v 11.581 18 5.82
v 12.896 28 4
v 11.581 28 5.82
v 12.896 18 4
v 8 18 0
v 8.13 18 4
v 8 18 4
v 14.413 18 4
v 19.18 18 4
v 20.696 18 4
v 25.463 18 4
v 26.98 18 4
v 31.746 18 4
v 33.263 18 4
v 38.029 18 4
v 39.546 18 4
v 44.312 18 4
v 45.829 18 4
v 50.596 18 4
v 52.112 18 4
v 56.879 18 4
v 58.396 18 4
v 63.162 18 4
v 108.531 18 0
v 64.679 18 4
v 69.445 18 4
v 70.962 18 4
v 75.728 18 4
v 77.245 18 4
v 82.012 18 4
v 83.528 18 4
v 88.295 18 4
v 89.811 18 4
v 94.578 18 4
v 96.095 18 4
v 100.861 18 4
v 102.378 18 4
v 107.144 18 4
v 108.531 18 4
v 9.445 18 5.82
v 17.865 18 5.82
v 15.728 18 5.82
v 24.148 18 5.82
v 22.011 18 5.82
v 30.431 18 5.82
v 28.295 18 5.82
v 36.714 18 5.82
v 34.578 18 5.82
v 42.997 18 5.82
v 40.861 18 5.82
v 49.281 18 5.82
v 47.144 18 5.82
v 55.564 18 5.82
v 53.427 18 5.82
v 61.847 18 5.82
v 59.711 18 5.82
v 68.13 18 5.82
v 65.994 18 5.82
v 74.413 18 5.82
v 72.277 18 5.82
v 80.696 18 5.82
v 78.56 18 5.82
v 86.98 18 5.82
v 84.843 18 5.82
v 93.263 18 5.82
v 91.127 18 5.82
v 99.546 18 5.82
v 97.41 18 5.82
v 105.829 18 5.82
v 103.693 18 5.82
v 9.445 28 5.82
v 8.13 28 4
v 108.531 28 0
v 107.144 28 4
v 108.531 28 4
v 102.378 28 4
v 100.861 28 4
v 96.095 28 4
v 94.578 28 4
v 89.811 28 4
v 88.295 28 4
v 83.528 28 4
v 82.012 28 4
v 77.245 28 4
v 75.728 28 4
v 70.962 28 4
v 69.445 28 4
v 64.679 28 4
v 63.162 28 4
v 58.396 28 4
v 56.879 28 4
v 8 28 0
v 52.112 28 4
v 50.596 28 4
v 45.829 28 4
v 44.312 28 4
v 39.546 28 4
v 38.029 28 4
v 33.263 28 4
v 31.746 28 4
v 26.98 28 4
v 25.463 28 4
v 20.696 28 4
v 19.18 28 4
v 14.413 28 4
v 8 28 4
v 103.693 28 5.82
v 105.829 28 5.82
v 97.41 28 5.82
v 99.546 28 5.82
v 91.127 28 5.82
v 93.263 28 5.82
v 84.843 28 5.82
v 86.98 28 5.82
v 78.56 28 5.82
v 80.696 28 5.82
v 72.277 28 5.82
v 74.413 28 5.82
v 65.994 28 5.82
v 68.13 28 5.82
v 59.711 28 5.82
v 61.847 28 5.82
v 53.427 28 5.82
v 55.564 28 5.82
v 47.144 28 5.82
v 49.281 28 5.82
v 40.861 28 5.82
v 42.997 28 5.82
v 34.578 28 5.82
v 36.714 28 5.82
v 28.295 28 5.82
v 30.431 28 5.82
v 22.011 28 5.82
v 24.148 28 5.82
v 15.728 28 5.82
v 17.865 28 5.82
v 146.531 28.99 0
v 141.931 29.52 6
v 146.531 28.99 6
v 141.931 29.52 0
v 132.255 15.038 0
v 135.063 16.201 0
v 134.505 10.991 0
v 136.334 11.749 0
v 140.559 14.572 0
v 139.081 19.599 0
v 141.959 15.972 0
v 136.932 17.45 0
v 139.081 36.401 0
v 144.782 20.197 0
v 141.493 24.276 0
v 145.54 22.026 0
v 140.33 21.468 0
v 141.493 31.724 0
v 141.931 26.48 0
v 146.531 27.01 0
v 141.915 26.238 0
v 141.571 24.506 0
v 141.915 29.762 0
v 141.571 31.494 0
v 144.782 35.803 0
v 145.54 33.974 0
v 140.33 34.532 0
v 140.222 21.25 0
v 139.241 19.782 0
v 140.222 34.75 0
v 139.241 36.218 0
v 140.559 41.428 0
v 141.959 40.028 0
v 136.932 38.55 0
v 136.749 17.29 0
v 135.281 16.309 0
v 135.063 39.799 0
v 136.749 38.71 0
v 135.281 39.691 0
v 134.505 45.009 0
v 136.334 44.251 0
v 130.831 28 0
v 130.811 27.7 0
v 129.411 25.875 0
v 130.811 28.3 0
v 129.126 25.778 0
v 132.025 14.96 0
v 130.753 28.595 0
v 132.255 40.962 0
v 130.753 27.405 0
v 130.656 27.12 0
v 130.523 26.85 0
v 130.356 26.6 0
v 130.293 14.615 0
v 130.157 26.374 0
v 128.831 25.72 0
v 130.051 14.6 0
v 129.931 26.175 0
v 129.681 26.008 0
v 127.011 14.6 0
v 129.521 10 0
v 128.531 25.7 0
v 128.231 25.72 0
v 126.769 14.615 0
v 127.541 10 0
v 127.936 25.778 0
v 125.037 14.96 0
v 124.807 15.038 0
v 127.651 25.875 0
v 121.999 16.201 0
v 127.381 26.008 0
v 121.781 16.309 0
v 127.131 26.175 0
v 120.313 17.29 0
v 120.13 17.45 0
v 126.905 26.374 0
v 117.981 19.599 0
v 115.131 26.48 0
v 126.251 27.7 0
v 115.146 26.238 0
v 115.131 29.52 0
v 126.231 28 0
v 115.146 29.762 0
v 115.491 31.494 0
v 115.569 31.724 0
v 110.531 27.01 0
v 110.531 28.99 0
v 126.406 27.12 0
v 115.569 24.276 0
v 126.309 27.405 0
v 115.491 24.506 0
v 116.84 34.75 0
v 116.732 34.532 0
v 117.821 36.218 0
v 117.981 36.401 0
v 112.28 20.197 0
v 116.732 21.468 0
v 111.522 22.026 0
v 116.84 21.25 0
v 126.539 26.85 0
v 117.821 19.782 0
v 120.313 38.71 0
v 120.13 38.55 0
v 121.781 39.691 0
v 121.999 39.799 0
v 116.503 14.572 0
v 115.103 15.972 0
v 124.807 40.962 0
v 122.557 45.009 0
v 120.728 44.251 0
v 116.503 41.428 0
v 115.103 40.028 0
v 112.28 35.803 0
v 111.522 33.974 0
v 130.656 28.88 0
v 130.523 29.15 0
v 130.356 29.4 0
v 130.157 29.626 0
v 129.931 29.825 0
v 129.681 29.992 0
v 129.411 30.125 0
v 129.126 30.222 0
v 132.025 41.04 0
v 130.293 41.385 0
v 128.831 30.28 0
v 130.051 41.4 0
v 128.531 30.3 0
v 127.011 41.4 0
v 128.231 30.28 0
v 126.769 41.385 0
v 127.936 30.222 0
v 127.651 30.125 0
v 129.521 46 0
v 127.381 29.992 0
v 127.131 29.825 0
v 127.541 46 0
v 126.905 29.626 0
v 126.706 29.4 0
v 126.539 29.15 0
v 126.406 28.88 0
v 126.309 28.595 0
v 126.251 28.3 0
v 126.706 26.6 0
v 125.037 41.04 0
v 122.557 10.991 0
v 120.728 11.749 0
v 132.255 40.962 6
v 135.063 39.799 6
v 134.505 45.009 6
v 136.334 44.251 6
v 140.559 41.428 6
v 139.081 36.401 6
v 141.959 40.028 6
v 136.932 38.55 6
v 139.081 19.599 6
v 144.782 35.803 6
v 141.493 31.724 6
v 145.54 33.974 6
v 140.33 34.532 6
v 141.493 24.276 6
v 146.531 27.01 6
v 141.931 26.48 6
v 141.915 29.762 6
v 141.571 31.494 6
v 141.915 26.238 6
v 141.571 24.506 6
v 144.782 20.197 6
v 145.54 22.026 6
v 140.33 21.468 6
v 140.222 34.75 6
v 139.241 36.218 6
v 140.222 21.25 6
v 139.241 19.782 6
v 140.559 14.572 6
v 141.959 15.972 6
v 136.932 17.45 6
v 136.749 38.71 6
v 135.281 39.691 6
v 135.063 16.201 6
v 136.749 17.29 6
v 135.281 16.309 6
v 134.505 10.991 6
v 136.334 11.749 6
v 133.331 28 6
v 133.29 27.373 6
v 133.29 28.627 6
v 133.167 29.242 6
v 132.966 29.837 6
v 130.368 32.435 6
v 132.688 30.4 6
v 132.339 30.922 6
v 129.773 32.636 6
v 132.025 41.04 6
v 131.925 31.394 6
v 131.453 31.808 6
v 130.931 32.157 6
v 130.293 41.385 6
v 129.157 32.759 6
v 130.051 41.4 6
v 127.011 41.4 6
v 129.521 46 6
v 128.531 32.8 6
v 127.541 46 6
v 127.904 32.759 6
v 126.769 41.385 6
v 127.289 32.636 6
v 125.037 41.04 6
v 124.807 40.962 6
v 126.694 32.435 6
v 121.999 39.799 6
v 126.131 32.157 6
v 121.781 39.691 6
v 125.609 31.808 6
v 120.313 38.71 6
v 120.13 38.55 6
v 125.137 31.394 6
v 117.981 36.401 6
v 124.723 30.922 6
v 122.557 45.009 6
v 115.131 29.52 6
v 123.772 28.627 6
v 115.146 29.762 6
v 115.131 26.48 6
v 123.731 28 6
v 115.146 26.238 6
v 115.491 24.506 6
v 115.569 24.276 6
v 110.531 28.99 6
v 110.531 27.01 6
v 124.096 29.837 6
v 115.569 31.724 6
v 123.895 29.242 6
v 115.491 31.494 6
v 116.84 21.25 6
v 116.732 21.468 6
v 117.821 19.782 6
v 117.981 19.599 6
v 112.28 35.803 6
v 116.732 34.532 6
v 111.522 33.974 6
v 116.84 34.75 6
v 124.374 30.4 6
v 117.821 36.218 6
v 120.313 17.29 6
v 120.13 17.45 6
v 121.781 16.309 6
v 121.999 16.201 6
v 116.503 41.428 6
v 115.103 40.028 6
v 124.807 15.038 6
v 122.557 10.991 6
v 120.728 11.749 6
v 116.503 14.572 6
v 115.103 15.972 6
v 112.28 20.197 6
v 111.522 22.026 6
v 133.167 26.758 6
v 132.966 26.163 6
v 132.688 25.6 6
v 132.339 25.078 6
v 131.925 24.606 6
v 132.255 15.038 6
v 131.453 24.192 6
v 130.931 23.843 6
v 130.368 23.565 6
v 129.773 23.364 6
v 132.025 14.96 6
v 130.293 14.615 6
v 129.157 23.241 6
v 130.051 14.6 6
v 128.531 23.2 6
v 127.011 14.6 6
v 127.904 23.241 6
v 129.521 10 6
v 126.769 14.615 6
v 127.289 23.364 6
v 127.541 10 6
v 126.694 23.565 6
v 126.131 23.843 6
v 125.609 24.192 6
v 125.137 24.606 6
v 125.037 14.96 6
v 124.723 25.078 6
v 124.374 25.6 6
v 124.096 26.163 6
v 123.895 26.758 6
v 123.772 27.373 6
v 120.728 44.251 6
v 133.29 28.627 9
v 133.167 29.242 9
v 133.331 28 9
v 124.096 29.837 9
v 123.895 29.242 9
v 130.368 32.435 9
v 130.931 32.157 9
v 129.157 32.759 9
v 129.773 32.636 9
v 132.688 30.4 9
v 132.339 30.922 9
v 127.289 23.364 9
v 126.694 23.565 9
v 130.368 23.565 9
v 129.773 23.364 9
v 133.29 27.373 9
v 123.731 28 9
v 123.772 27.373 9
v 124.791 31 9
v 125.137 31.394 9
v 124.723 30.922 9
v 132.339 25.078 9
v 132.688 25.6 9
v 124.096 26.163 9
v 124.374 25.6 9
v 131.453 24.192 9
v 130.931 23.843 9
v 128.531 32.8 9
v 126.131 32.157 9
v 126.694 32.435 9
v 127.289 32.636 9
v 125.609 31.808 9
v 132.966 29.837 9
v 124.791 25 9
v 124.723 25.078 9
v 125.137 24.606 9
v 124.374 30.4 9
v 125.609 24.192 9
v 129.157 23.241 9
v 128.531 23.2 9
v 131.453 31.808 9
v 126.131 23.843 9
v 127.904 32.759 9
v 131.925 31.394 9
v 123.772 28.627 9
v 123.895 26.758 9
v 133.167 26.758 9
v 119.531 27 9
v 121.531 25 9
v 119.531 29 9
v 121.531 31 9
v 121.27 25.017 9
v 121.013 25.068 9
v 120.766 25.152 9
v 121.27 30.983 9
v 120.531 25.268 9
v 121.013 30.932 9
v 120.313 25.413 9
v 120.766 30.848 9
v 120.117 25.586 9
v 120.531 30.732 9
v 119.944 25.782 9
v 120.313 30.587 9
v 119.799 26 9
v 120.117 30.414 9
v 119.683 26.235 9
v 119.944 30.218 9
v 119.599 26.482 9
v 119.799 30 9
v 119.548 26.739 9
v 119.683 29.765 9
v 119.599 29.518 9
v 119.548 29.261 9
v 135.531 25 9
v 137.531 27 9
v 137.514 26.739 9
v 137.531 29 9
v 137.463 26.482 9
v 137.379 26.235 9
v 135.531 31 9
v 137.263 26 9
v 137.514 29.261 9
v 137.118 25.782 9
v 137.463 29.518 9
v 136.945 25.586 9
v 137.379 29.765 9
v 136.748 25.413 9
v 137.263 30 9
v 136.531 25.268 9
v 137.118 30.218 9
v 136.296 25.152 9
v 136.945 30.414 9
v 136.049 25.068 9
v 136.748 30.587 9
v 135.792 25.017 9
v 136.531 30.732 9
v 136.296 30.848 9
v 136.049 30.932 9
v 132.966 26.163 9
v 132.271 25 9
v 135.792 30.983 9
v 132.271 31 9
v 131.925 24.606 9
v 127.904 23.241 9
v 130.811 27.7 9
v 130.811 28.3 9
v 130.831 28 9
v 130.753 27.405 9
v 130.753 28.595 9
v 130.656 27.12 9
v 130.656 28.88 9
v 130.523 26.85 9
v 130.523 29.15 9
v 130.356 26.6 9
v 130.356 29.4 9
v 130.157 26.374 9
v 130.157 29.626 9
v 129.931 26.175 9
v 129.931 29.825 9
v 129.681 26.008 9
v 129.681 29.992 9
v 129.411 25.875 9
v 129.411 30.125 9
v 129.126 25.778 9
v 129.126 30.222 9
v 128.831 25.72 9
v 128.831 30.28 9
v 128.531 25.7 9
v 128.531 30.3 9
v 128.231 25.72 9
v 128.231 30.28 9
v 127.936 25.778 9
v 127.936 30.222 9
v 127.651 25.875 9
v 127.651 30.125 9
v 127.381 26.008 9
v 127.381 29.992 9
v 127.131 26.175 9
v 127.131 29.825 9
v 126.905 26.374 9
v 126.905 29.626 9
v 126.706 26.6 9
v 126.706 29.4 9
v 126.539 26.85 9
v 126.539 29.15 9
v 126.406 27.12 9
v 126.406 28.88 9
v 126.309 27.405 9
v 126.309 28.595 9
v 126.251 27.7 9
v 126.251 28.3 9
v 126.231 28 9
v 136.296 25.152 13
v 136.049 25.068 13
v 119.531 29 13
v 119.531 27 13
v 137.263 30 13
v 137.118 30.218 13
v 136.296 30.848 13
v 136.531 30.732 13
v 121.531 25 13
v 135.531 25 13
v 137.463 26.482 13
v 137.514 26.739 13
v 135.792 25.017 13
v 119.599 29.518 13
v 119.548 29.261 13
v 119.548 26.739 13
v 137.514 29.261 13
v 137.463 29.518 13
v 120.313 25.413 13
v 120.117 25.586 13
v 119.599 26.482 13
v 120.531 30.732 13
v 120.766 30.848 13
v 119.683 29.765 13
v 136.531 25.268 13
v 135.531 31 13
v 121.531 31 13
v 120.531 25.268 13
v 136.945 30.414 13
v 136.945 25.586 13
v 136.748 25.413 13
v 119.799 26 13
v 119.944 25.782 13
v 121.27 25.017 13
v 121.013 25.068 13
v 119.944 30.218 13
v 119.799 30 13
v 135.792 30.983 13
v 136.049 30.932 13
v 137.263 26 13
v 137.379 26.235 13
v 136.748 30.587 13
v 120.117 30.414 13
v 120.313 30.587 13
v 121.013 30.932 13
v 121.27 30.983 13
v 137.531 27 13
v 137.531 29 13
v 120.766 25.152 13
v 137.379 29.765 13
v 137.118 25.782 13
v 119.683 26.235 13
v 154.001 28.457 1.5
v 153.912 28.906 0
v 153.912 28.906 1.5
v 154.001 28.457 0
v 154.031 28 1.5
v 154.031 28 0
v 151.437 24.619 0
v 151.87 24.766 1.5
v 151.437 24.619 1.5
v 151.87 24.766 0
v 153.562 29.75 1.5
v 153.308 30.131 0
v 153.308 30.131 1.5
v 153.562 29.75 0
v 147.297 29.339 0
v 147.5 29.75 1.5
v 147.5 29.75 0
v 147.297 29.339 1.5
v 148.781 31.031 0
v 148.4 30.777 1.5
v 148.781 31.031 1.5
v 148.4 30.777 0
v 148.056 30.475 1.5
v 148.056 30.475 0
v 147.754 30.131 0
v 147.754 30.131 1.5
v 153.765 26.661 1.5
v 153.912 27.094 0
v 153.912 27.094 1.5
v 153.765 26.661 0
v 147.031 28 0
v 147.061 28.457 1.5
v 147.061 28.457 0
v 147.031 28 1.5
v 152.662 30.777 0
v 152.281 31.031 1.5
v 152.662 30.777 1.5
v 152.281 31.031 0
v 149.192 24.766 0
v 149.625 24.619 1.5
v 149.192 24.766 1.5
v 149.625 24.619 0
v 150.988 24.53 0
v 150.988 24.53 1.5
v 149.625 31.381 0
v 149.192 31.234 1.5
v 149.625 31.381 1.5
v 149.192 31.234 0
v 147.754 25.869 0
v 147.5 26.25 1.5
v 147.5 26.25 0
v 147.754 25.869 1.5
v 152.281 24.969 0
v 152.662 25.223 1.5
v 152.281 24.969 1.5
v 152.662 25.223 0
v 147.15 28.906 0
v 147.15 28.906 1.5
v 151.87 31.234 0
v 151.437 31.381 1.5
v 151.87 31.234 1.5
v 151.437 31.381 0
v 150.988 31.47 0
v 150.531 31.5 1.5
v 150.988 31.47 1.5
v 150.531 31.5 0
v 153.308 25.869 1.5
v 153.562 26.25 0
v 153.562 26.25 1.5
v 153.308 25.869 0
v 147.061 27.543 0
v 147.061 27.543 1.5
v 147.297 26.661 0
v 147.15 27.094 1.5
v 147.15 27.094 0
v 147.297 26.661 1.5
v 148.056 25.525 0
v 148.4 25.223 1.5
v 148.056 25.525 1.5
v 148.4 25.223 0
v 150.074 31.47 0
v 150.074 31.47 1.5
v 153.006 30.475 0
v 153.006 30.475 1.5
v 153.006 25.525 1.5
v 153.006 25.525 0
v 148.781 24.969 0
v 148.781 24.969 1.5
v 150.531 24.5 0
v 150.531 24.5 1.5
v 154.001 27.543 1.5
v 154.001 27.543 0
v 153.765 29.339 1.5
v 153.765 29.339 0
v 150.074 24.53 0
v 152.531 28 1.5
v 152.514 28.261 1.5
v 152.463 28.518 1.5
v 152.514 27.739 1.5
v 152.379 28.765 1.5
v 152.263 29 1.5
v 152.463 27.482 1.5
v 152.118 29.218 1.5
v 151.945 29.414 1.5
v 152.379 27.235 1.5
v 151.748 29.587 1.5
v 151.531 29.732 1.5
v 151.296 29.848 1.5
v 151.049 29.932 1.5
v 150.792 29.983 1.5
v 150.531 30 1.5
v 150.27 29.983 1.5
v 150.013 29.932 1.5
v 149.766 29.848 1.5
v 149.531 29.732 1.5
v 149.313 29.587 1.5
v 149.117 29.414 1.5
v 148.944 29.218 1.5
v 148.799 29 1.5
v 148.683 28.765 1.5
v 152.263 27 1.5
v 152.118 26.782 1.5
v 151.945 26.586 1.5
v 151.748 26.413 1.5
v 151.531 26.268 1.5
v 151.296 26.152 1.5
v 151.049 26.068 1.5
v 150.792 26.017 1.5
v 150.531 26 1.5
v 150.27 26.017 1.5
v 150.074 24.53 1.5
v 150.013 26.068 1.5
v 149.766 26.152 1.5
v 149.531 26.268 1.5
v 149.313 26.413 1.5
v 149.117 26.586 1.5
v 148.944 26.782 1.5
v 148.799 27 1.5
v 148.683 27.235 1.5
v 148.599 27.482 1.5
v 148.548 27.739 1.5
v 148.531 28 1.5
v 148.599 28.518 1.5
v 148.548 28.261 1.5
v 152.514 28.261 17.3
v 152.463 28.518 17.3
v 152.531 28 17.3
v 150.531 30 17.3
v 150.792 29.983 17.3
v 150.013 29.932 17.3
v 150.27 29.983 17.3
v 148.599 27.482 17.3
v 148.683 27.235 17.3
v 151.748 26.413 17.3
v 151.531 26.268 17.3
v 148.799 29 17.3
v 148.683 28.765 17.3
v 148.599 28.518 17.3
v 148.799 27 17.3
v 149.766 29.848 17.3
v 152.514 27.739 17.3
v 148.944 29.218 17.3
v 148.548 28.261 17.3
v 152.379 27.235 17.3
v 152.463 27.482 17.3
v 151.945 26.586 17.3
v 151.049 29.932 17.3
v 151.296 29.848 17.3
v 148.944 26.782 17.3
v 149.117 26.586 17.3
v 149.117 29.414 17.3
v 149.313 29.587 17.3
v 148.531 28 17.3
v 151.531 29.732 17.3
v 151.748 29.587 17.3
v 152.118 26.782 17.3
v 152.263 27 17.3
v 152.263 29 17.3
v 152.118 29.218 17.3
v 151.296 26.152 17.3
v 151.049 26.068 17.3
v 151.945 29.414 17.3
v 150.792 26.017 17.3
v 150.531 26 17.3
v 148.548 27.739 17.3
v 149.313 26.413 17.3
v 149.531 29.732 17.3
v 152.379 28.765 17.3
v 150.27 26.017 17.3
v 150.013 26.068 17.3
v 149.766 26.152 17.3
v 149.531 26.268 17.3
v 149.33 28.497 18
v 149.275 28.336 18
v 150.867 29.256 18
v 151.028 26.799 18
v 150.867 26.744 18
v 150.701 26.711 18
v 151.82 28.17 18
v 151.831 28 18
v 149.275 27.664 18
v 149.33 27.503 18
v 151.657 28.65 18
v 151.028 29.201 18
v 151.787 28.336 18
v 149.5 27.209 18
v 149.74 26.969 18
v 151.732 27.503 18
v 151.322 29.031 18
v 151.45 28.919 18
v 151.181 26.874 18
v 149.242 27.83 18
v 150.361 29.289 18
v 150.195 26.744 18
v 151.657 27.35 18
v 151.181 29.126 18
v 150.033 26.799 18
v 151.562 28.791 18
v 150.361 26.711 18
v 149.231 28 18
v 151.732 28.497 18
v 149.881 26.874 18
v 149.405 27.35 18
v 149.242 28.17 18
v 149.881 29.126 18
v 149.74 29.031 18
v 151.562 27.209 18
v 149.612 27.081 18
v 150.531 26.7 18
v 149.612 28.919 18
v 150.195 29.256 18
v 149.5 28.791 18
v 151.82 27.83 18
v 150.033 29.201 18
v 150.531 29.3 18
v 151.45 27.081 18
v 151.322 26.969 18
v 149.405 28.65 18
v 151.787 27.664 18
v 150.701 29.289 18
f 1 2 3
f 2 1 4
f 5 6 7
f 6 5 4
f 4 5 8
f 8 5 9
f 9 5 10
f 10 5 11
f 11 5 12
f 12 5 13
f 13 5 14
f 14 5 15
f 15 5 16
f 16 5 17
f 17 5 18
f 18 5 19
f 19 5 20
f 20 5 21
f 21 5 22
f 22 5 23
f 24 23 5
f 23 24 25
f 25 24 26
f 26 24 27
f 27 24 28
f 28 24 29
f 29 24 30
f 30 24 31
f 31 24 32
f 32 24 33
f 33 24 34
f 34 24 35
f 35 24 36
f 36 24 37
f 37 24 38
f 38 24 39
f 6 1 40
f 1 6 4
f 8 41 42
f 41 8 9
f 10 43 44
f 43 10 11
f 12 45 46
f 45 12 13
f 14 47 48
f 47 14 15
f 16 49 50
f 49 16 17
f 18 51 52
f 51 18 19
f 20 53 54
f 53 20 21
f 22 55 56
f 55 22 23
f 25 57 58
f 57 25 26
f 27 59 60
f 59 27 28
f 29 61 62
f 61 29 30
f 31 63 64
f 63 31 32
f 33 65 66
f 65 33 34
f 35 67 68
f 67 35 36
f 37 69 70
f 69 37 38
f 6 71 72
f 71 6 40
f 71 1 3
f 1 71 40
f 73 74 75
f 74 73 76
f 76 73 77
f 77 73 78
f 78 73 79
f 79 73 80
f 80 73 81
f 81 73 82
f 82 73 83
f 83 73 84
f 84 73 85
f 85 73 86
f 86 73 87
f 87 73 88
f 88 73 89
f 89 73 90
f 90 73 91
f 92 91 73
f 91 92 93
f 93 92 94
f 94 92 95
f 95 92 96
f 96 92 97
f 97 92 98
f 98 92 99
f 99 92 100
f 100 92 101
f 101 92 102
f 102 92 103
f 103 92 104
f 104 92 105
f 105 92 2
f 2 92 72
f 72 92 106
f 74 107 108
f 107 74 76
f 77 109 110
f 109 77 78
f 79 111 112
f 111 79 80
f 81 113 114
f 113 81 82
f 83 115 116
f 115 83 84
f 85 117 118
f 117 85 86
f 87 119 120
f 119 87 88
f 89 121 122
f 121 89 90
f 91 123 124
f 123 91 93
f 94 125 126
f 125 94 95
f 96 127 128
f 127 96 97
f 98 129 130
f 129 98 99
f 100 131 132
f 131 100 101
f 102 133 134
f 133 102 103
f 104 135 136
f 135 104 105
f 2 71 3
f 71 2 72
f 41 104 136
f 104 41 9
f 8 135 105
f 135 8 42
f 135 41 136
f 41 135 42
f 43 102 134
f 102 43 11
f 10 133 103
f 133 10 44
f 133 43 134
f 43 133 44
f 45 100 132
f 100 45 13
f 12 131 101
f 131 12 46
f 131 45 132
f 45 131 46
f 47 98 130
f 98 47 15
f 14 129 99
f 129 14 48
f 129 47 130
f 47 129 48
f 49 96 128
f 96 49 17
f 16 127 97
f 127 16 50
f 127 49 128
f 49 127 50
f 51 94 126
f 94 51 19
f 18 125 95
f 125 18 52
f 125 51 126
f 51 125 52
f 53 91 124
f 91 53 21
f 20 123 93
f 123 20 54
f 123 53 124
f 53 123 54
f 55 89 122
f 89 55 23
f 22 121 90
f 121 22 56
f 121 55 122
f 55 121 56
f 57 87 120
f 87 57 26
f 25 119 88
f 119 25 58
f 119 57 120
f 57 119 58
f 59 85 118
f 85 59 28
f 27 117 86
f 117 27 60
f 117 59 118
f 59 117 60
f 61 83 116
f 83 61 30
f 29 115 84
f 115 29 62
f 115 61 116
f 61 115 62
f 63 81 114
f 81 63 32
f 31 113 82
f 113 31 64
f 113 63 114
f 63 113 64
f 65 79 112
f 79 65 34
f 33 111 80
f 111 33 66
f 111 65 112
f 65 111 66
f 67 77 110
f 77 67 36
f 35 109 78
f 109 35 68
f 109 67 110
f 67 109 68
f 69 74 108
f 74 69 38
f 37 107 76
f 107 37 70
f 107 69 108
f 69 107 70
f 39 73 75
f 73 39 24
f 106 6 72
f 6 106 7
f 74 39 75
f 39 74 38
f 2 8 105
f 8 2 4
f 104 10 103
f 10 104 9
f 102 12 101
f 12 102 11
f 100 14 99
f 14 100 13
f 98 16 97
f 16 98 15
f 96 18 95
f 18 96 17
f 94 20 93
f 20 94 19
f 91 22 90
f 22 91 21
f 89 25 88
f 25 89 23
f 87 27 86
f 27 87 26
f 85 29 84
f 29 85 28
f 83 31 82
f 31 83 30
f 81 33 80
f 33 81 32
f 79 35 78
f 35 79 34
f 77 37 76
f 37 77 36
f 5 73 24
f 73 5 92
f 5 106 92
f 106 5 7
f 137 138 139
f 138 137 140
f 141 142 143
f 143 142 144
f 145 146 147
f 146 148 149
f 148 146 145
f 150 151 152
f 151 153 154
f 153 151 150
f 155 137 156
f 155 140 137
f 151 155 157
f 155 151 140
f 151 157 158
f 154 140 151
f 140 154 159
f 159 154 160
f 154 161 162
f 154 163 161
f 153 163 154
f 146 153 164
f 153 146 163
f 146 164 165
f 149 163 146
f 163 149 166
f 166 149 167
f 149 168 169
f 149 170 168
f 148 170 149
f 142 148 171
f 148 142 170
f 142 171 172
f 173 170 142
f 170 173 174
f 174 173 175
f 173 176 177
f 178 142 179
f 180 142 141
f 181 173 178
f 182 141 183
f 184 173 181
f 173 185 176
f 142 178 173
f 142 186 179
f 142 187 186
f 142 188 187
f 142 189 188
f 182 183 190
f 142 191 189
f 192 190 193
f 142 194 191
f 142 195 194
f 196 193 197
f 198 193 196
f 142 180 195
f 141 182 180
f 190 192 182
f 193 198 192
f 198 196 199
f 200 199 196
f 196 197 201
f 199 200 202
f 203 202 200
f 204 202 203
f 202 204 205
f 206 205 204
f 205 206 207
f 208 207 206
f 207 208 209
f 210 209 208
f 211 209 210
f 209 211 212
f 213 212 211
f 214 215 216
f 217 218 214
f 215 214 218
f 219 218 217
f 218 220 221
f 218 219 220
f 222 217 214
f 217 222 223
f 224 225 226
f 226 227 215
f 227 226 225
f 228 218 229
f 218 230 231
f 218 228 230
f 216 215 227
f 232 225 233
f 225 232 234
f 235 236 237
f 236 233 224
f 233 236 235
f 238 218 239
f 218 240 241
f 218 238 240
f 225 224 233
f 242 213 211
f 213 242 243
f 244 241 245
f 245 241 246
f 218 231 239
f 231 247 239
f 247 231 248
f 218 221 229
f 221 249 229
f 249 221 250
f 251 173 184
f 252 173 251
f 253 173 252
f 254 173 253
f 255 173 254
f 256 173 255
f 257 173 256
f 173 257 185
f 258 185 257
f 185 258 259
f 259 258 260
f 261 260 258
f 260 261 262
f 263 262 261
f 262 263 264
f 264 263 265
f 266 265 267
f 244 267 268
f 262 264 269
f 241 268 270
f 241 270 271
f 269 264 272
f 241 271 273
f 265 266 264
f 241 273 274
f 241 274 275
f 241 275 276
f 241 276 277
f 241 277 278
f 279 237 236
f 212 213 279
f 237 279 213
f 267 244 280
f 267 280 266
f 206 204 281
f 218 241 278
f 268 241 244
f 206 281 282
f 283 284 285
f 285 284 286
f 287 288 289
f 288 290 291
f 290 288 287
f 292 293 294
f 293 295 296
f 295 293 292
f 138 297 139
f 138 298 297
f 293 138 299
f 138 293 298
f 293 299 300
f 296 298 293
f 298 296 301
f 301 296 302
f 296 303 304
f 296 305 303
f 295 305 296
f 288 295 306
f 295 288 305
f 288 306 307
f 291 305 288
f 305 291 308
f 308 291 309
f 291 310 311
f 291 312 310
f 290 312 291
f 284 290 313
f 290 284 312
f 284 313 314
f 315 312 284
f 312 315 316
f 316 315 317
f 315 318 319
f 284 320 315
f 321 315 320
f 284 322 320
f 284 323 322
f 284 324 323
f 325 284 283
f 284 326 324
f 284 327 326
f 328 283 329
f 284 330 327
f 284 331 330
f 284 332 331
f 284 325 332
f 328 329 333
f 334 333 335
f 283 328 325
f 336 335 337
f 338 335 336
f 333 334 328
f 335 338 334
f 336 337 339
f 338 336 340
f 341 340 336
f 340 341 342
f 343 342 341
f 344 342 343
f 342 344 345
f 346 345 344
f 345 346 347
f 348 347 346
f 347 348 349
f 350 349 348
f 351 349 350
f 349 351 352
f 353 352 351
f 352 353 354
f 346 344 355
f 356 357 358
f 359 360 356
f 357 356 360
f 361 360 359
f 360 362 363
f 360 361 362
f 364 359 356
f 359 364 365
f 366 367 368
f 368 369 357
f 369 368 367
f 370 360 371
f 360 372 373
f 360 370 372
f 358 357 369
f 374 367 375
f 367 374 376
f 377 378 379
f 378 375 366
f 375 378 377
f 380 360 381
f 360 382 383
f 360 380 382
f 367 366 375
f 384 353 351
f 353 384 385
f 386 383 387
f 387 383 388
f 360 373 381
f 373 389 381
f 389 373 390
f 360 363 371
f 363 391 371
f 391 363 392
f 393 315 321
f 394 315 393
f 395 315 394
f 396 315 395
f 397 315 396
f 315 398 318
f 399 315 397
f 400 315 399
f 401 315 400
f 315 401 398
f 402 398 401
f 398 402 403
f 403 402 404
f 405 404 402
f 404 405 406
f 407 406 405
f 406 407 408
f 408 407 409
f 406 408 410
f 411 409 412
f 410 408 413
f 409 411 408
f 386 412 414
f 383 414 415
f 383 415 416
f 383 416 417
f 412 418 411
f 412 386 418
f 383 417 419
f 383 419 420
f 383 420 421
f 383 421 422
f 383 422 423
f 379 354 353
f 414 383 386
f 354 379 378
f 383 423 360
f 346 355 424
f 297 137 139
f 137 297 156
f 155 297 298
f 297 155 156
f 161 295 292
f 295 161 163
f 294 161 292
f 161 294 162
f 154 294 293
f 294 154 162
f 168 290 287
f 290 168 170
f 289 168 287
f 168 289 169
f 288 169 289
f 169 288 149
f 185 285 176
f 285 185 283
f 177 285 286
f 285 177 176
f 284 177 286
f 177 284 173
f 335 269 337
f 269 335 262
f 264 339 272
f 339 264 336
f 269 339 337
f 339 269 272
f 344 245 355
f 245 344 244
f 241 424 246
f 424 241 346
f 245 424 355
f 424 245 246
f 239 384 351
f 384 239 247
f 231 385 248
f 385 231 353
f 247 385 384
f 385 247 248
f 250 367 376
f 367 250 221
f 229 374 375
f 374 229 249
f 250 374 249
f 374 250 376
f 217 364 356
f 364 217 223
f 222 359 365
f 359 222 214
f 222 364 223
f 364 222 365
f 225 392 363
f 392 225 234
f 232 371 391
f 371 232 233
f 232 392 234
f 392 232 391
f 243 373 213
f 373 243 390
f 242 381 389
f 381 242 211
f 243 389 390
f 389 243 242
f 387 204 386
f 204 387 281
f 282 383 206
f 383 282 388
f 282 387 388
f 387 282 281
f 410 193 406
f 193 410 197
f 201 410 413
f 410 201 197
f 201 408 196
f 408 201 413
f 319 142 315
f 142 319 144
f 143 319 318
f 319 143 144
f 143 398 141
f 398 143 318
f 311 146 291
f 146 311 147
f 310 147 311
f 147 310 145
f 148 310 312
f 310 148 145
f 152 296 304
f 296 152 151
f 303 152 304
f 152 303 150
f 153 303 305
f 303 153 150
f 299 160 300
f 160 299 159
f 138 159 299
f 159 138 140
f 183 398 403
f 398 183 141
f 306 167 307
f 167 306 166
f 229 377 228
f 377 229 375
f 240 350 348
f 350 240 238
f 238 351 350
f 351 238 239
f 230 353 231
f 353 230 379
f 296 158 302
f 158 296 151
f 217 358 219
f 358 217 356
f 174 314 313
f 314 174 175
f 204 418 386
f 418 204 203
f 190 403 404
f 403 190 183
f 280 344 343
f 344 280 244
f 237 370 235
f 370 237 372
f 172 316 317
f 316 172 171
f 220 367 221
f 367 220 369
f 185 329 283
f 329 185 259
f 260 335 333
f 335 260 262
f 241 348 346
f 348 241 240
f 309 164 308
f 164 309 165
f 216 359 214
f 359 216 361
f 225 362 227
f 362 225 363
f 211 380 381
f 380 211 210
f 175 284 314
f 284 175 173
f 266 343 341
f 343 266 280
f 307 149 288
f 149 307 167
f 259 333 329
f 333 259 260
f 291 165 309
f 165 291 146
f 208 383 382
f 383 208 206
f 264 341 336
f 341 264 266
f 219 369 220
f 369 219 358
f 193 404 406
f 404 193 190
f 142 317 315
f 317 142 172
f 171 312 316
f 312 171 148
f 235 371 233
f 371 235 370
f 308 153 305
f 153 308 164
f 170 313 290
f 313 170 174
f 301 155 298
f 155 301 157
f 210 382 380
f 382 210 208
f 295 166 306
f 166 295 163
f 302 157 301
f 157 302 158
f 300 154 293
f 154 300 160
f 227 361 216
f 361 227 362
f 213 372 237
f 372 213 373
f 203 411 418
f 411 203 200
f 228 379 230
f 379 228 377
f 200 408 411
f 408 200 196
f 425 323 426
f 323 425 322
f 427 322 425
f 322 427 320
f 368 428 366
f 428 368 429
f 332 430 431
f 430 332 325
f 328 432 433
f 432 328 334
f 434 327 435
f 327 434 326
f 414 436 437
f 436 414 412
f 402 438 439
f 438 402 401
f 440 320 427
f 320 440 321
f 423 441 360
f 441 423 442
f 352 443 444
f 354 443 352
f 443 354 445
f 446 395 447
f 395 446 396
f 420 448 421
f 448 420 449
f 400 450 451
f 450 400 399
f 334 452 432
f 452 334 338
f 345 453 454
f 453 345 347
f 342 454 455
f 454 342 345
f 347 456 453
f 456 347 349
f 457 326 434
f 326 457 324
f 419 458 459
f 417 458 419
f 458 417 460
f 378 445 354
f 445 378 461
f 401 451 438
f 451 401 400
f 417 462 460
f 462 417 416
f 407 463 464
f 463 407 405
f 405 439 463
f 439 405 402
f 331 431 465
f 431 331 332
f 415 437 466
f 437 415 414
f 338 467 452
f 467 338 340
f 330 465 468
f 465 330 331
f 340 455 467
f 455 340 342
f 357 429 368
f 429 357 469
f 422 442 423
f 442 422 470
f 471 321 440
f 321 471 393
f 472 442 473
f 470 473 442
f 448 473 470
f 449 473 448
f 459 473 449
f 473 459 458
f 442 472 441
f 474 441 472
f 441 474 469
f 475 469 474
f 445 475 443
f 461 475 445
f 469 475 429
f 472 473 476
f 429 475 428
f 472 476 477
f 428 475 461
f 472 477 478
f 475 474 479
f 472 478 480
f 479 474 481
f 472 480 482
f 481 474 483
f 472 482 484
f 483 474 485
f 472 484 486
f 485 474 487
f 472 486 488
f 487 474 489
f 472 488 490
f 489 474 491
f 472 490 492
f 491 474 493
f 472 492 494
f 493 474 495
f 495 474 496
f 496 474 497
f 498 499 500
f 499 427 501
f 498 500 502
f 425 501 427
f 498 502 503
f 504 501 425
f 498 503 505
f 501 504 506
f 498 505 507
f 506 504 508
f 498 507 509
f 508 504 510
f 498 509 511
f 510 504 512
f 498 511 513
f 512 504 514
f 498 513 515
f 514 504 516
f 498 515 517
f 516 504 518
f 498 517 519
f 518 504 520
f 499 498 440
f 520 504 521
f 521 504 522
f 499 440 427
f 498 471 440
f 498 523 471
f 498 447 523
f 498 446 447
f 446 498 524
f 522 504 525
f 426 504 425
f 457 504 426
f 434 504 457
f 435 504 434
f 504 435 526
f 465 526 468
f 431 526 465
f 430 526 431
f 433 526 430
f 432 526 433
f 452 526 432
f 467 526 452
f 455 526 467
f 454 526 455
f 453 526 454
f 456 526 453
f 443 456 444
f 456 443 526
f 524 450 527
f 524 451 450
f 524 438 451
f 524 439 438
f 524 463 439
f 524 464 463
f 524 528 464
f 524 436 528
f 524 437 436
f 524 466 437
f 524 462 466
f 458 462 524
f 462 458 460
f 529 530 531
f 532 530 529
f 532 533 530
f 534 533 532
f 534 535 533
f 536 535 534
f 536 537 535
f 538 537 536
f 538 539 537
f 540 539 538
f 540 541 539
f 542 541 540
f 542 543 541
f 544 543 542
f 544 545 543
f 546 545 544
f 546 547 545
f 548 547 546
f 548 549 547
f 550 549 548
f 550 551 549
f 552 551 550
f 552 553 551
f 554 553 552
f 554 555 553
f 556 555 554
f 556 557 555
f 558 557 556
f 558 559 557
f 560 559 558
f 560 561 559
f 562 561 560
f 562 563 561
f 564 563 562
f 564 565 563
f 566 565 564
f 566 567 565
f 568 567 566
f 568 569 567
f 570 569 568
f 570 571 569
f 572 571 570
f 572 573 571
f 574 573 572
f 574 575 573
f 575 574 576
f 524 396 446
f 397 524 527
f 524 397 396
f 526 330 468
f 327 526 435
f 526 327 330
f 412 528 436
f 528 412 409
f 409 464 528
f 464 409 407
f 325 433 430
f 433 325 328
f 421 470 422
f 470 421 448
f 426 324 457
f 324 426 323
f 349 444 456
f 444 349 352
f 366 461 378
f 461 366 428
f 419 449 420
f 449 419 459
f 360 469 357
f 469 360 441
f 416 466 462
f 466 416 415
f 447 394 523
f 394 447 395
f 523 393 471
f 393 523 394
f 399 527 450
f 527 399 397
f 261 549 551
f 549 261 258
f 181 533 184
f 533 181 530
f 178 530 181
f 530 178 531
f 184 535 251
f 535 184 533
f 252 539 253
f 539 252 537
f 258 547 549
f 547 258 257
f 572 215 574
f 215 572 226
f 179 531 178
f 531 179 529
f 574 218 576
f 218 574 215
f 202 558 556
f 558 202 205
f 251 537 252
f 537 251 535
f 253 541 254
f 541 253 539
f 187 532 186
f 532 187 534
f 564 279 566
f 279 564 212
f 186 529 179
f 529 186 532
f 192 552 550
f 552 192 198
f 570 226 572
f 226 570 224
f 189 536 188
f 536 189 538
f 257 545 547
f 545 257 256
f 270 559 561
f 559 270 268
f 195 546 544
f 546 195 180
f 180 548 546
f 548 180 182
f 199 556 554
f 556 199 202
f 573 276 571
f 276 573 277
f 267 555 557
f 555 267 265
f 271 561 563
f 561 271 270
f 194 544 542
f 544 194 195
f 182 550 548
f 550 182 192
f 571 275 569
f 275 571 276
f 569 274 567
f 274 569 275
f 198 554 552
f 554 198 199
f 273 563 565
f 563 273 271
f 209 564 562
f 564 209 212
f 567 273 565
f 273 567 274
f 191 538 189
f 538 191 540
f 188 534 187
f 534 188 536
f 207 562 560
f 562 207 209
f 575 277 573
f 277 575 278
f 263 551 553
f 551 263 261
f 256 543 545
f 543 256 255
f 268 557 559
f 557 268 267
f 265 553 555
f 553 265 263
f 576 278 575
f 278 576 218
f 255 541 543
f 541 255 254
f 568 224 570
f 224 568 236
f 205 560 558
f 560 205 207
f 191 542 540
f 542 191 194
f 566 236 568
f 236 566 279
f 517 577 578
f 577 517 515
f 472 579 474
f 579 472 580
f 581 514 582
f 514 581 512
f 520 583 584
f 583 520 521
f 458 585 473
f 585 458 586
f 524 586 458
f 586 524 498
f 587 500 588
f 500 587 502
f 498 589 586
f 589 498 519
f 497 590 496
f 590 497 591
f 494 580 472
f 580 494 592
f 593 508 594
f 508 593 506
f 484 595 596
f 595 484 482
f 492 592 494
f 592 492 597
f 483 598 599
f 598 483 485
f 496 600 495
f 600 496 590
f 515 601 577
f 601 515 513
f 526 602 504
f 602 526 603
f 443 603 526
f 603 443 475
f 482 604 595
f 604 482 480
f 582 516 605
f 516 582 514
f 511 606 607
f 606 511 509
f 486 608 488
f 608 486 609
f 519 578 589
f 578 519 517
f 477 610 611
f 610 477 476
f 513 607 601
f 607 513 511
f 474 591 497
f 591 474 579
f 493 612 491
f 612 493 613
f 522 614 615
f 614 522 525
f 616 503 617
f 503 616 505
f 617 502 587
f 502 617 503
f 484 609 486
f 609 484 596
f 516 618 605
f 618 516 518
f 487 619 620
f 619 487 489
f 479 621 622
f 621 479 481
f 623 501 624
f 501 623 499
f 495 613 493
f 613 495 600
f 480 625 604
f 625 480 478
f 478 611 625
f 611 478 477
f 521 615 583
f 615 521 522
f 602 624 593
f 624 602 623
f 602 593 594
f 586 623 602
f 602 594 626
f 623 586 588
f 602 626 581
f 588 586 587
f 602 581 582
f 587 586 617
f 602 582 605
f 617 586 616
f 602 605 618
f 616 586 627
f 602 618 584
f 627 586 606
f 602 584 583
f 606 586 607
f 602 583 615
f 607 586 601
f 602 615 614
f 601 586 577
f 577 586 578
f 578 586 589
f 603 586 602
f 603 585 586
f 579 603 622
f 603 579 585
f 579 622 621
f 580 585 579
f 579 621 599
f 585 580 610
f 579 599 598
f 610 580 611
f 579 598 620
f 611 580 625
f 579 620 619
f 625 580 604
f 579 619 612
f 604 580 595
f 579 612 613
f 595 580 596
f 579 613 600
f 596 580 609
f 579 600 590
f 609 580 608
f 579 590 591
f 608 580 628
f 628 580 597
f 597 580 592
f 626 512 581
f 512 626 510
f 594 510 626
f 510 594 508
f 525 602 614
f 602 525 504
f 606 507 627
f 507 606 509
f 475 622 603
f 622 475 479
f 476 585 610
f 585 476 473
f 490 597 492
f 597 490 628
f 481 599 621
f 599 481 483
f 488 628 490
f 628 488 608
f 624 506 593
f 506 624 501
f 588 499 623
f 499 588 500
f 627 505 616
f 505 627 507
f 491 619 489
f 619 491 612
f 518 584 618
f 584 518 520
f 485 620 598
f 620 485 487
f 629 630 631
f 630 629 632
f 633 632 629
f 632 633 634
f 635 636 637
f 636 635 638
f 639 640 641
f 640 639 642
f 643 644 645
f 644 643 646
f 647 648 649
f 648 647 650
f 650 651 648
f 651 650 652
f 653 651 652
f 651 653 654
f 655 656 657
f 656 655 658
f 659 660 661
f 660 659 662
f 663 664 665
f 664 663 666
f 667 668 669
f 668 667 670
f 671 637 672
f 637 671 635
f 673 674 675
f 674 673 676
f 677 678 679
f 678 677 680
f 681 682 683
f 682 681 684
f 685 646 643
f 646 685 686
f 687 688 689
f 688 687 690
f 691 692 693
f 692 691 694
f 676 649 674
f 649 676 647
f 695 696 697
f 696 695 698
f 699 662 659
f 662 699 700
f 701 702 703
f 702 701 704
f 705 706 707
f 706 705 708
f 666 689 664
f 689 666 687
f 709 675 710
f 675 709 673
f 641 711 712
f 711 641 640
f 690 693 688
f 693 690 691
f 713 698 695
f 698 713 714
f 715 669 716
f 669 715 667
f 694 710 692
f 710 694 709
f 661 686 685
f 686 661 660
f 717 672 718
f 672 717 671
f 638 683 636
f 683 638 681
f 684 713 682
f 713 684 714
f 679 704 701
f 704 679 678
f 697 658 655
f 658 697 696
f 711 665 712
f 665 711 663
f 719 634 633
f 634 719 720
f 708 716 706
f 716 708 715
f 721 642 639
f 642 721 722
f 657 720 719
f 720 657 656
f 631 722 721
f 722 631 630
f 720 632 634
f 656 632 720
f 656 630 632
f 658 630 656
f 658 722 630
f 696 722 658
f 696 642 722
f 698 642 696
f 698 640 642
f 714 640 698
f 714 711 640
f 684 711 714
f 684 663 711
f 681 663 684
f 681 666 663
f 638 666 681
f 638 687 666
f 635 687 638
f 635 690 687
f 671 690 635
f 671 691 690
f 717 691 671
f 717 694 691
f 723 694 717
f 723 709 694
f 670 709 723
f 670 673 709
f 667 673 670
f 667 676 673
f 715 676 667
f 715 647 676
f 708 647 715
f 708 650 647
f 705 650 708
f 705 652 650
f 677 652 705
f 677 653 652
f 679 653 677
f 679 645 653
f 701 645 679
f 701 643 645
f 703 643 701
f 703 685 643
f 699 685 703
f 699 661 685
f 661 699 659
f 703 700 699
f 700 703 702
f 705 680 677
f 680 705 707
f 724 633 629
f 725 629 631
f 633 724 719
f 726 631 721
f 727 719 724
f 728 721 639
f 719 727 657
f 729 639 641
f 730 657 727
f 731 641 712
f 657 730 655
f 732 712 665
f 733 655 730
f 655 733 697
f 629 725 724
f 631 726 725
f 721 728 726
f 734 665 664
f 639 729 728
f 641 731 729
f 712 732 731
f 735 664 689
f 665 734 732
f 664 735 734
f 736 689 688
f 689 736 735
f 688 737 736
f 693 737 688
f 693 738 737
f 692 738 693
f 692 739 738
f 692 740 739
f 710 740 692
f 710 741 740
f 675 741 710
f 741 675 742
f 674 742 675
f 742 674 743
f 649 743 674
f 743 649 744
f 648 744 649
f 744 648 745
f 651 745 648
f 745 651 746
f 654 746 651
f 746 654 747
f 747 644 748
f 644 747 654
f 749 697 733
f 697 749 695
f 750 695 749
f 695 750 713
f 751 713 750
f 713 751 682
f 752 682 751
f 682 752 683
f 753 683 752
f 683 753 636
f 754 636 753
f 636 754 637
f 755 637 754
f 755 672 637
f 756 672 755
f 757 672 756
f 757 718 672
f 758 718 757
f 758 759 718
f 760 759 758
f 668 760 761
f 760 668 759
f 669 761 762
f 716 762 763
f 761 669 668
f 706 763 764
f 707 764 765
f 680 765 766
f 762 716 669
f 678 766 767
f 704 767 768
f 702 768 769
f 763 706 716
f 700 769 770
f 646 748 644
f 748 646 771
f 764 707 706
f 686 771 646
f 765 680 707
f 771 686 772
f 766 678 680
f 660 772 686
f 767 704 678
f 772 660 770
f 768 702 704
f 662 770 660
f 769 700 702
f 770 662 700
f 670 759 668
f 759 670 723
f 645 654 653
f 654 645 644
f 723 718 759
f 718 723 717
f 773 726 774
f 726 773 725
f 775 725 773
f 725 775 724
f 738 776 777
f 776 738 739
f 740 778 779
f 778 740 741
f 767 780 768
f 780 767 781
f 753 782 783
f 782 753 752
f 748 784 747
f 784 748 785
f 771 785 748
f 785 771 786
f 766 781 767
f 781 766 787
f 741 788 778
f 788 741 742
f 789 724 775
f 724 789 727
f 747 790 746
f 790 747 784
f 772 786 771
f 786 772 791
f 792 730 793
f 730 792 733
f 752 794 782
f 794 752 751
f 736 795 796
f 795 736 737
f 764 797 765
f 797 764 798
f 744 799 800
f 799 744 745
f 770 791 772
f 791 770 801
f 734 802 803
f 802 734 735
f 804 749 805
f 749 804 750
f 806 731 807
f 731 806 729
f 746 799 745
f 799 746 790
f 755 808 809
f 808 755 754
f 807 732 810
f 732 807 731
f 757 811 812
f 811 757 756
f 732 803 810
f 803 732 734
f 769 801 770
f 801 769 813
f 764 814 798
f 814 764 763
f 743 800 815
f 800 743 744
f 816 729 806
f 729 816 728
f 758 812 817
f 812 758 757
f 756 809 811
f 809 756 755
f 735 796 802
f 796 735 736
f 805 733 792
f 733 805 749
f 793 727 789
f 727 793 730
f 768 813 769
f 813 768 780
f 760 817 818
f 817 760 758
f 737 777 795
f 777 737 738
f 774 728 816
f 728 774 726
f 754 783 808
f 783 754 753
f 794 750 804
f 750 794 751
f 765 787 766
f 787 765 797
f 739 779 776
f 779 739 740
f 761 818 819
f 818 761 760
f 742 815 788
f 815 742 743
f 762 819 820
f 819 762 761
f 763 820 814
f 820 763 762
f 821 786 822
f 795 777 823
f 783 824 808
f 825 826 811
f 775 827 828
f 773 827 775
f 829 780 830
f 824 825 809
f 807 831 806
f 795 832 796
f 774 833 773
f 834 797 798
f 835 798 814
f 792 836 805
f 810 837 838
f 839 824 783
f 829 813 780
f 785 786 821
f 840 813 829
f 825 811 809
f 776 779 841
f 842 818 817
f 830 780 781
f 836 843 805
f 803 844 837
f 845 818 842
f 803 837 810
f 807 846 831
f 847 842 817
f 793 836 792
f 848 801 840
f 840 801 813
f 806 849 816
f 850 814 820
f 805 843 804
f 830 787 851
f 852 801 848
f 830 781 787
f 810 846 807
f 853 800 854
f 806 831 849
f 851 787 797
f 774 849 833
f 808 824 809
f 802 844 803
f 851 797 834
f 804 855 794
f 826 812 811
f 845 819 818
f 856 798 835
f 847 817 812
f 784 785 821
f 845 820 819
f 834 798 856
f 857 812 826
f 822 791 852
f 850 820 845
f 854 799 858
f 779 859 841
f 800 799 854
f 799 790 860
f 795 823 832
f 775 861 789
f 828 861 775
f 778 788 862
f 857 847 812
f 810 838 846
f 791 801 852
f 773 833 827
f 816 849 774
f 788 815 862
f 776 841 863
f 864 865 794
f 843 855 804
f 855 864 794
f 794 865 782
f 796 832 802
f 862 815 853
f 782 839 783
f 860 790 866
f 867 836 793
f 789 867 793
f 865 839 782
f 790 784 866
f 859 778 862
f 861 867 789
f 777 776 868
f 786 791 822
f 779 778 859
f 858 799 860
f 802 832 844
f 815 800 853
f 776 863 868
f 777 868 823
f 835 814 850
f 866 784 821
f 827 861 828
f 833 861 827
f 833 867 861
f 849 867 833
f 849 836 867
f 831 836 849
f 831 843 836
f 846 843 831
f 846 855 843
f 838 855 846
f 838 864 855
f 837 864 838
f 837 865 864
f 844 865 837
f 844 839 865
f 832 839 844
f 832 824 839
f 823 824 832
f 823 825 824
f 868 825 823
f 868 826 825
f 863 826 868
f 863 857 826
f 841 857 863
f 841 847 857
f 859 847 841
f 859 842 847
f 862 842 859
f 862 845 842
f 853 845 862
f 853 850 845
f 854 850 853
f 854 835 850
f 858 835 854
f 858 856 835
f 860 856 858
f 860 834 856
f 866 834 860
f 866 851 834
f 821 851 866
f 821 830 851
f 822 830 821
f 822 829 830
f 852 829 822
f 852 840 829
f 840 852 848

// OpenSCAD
/*
Sample 100: Zahnstange und Ritzel — Modul 2,00
Generated from the FDM Mechanical Sample Library.
Units: millimetres.

Override examples:
  openscad -o custom.stl -D 'view="plate"' -D 'render_fn=64' model.scad
  openscad -o preview.png -D 'view="assembly"' model.scad
*/
use <../../../library/fdm_mechanisms.scad>

render_fn = is_undef(render_fn) ? 48 : render_fn;
view = is_undef(view) ? "plate" : view;
$fn = render_fn;

sample_rack_pinion(
    view=view,
    teeth=16,
    module_size=2,
    clearance=0.3
);
